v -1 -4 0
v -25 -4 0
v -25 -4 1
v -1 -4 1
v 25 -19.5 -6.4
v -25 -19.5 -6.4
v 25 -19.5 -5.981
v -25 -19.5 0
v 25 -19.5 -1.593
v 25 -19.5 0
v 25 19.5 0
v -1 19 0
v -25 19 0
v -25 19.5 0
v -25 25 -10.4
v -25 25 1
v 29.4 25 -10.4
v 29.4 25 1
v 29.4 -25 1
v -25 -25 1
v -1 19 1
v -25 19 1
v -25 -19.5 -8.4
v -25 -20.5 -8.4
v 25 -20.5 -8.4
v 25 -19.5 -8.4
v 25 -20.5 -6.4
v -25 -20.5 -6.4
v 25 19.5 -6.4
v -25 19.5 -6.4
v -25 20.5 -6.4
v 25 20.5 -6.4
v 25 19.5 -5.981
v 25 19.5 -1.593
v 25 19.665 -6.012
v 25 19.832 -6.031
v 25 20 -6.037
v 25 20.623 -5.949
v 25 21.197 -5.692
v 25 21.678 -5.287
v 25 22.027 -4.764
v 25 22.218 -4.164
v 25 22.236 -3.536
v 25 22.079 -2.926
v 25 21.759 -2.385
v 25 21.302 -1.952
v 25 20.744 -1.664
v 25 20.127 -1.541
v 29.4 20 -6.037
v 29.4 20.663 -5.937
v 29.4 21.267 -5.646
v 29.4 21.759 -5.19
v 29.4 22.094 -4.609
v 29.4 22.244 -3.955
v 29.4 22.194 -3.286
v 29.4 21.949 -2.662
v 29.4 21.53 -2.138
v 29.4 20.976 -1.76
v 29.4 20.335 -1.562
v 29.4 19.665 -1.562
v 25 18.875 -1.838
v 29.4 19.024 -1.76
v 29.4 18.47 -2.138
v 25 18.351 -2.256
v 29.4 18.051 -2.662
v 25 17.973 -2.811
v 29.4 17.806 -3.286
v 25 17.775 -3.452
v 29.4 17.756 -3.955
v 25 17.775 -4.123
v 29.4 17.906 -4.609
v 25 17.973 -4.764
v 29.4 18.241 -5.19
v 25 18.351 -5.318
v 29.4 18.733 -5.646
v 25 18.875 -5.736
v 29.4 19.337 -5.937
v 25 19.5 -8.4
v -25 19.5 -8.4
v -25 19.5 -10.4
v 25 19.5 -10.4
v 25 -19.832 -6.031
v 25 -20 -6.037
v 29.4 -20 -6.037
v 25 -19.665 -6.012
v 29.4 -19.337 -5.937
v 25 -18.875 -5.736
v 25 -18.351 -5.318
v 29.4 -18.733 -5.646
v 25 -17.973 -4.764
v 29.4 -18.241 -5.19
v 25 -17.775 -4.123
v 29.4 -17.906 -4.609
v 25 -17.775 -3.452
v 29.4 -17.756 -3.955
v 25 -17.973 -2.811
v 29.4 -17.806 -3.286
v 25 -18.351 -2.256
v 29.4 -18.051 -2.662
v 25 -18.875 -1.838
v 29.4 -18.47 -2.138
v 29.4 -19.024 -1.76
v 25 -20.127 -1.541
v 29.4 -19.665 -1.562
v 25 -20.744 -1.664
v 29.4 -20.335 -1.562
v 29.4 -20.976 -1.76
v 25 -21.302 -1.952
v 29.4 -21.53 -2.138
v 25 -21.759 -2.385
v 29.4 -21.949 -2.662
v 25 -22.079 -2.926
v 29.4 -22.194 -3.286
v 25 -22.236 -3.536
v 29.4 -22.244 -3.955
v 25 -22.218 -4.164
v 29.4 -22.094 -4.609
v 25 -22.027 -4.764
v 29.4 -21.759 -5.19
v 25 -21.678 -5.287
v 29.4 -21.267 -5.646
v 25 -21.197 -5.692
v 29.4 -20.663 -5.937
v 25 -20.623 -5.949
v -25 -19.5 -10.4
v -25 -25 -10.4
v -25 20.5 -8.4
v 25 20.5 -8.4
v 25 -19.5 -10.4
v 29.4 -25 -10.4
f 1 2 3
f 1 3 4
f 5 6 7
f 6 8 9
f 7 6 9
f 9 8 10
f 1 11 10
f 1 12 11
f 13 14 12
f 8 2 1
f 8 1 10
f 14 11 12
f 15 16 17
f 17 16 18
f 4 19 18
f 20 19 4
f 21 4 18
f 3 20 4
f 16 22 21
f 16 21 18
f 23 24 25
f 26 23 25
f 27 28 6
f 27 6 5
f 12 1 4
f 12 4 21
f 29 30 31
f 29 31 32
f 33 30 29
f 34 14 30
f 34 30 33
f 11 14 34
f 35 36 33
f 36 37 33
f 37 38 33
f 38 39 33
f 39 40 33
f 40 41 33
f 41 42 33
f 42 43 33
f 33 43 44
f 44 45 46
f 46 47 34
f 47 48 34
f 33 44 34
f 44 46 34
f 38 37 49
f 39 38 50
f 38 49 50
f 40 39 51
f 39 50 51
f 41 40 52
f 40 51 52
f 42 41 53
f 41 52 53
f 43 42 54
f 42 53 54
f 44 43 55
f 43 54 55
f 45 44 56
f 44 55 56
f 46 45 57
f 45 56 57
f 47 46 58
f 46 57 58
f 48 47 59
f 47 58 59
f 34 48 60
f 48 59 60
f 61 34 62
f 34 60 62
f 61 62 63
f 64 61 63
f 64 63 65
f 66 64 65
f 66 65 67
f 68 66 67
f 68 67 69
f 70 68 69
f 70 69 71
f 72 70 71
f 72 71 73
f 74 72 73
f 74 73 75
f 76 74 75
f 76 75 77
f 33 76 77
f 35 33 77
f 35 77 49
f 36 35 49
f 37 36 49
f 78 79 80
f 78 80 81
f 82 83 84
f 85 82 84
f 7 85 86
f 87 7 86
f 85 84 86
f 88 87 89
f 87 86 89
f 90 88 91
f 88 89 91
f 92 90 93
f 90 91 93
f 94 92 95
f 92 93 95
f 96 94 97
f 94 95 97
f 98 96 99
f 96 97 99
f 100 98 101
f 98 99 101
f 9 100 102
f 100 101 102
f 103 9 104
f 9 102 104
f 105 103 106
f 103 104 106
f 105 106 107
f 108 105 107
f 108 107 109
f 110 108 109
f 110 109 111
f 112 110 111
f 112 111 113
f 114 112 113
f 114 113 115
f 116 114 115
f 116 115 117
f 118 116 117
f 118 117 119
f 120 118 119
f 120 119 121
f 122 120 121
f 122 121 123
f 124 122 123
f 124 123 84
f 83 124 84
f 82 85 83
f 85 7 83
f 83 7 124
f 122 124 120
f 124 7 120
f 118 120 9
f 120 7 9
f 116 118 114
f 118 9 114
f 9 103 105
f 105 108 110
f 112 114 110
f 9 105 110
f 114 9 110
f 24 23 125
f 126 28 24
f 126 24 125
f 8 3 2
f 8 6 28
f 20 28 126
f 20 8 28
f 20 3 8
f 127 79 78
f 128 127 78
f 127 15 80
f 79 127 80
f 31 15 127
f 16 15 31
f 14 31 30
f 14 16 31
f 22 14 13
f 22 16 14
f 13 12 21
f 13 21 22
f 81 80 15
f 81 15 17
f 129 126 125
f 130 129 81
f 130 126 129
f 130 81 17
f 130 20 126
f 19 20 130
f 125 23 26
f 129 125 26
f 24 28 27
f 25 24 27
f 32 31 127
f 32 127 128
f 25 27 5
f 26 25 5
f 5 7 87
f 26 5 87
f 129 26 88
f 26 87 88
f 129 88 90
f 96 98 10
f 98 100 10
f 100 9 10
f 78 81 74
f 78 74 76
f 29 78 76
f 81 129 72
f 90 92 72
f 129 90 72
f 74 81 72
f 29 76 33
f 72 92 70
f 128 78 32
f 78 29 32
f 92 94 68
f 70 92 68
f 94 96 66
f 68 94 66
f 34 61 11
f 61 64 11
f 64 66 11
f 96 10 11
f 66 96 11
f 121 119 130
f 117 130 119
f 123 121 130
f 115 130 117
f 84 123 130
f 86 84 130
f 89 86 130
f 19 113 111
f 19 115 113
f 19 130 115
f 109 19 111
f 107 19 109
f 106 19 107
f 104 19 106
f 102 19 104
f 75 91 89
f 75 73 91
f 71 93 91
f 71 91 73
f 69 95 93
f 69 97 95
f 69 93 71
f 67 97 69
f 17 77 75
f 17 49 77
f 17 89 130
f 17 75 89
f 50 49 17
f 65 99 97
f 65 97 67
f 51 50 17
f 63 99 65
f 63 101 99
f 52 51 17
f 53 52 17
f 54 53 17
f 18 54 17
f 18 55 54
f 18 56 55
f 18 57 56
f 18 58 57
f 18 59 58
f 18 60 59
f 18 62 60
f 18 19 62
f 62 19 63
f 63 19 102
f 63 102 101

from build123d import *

# Parameters (mm, degrees)
BOSS_EXTRUDE1_DEPTH = 1
SKETCH2_W           = 50
SKETCH2_H           = 11.4
BOSS_EXTRUDE2_DEPTH = 4.4
SKETCH3_R           = 2.25
CUT_EXTRUDE1_DEPTH  = 4.4
SKETCH4_W           = 50
SKETCH4_H           = 5.5
BOSS_EXTRUDE3_DEPTH = 6.4
SKETCH5_W           = 50
SKETCH5_H           = 4.5
BOSS_EXTRUDE4_DEPTH = 2
SKETCH6_W           = 50
SKETCH6_H           = 5.5
BOSS_EXTRUDE5_DEPTH = 2


with BuildPart() as part:
    # Sketch1 → Boss-Extrude1 (new body)
    with BuildSketch(Plane(origin=(0, 0, 0), x_dir=(0, 1, 0), z_dir=(0, 0, 1))):
        Polygon((-4, 25), (-4, 1), (19, 1), (19, 25), (25, 25), (25, -25), (-25, -25), (-25, 25), align=None)
    extrude(amount=BOSS_EXTRUDE1_DEPTH)

    # Sketch2 → Boss-Extrude2 (add)
    with BuildSketch(Plane.YZ.offset(25)):
        with Locations((0, -4.7)):
            Rectangle(SKETCH2_W, SKETCH2_H)
    extrude(amount=BOSS_EXTRUDE2_DEPTH)

    # Sketch3 → Cut-Extrude1 (cut)
    with BuildSketch(Plane.YZ.offset(29.4)):
        with Locations(Location((-20, -3.787139035, 0), (0, 0, 270))):
            Circle(SKETCH3_R)
        with Locations(Location((20, -3.787139035, 0), (0, 0, 270))):
            Circle(SKETCH3_R)
    extrude(amount=-CUT_EXTRUDE1_DEPTH, mode=Mode.SUBTRACT)

    # Sketch4 → Boss-Extrude3 (add)
    with BuildSketch(Plane(origin=(0, 0, 0), x_dir=(1, 0, 0), z_dir=(0, 0, -1))):
        with Locations((0, -22.25)):
            Rectangle(SKETCH4_W, SKETCH4_H)
        with Locations((0, 22.25)):
            Rectangle(SKETCH4_W, SKETCH4_H)
    extrude(amount=BOSS_EXTRUDE3_DEPTH)

    # Sketch5 → Boss-Extrude4 (add)
    with BuildSketch(Plane(origin=(0, 0, -6.4), x_dir=(1, 0, 0), z_dir=(0, 0, -1))):
        with Locations((0, 22.75)):
            Rectangle(SKETCH5_W, SKETCH5_H)
        with Locations((0, -22.75)):
            Rectangle(SKETCH5_W, SKETCH5_H)
    extrude(amount=BOSS_EXTRUDE4_DEPTH)

    # Sketch6 → Boss-Extrude5 (add)
    with BuildSketch(Plane(origin=(0, 0, -8.4), x_dir=(1, 0, 0), z_dir=(0, 0, -1))):
        with Locations((0, 22.25)):
            Rectangle(SKETCH6_W, SKETCH6_H)
        with Locations((0, -22.25)):
            Rectangle(SKETCH6_W, SKETCH6_H)
    extrude(amount=BOSS_EXTRUDE5_DEPTH)


solid = part.part
